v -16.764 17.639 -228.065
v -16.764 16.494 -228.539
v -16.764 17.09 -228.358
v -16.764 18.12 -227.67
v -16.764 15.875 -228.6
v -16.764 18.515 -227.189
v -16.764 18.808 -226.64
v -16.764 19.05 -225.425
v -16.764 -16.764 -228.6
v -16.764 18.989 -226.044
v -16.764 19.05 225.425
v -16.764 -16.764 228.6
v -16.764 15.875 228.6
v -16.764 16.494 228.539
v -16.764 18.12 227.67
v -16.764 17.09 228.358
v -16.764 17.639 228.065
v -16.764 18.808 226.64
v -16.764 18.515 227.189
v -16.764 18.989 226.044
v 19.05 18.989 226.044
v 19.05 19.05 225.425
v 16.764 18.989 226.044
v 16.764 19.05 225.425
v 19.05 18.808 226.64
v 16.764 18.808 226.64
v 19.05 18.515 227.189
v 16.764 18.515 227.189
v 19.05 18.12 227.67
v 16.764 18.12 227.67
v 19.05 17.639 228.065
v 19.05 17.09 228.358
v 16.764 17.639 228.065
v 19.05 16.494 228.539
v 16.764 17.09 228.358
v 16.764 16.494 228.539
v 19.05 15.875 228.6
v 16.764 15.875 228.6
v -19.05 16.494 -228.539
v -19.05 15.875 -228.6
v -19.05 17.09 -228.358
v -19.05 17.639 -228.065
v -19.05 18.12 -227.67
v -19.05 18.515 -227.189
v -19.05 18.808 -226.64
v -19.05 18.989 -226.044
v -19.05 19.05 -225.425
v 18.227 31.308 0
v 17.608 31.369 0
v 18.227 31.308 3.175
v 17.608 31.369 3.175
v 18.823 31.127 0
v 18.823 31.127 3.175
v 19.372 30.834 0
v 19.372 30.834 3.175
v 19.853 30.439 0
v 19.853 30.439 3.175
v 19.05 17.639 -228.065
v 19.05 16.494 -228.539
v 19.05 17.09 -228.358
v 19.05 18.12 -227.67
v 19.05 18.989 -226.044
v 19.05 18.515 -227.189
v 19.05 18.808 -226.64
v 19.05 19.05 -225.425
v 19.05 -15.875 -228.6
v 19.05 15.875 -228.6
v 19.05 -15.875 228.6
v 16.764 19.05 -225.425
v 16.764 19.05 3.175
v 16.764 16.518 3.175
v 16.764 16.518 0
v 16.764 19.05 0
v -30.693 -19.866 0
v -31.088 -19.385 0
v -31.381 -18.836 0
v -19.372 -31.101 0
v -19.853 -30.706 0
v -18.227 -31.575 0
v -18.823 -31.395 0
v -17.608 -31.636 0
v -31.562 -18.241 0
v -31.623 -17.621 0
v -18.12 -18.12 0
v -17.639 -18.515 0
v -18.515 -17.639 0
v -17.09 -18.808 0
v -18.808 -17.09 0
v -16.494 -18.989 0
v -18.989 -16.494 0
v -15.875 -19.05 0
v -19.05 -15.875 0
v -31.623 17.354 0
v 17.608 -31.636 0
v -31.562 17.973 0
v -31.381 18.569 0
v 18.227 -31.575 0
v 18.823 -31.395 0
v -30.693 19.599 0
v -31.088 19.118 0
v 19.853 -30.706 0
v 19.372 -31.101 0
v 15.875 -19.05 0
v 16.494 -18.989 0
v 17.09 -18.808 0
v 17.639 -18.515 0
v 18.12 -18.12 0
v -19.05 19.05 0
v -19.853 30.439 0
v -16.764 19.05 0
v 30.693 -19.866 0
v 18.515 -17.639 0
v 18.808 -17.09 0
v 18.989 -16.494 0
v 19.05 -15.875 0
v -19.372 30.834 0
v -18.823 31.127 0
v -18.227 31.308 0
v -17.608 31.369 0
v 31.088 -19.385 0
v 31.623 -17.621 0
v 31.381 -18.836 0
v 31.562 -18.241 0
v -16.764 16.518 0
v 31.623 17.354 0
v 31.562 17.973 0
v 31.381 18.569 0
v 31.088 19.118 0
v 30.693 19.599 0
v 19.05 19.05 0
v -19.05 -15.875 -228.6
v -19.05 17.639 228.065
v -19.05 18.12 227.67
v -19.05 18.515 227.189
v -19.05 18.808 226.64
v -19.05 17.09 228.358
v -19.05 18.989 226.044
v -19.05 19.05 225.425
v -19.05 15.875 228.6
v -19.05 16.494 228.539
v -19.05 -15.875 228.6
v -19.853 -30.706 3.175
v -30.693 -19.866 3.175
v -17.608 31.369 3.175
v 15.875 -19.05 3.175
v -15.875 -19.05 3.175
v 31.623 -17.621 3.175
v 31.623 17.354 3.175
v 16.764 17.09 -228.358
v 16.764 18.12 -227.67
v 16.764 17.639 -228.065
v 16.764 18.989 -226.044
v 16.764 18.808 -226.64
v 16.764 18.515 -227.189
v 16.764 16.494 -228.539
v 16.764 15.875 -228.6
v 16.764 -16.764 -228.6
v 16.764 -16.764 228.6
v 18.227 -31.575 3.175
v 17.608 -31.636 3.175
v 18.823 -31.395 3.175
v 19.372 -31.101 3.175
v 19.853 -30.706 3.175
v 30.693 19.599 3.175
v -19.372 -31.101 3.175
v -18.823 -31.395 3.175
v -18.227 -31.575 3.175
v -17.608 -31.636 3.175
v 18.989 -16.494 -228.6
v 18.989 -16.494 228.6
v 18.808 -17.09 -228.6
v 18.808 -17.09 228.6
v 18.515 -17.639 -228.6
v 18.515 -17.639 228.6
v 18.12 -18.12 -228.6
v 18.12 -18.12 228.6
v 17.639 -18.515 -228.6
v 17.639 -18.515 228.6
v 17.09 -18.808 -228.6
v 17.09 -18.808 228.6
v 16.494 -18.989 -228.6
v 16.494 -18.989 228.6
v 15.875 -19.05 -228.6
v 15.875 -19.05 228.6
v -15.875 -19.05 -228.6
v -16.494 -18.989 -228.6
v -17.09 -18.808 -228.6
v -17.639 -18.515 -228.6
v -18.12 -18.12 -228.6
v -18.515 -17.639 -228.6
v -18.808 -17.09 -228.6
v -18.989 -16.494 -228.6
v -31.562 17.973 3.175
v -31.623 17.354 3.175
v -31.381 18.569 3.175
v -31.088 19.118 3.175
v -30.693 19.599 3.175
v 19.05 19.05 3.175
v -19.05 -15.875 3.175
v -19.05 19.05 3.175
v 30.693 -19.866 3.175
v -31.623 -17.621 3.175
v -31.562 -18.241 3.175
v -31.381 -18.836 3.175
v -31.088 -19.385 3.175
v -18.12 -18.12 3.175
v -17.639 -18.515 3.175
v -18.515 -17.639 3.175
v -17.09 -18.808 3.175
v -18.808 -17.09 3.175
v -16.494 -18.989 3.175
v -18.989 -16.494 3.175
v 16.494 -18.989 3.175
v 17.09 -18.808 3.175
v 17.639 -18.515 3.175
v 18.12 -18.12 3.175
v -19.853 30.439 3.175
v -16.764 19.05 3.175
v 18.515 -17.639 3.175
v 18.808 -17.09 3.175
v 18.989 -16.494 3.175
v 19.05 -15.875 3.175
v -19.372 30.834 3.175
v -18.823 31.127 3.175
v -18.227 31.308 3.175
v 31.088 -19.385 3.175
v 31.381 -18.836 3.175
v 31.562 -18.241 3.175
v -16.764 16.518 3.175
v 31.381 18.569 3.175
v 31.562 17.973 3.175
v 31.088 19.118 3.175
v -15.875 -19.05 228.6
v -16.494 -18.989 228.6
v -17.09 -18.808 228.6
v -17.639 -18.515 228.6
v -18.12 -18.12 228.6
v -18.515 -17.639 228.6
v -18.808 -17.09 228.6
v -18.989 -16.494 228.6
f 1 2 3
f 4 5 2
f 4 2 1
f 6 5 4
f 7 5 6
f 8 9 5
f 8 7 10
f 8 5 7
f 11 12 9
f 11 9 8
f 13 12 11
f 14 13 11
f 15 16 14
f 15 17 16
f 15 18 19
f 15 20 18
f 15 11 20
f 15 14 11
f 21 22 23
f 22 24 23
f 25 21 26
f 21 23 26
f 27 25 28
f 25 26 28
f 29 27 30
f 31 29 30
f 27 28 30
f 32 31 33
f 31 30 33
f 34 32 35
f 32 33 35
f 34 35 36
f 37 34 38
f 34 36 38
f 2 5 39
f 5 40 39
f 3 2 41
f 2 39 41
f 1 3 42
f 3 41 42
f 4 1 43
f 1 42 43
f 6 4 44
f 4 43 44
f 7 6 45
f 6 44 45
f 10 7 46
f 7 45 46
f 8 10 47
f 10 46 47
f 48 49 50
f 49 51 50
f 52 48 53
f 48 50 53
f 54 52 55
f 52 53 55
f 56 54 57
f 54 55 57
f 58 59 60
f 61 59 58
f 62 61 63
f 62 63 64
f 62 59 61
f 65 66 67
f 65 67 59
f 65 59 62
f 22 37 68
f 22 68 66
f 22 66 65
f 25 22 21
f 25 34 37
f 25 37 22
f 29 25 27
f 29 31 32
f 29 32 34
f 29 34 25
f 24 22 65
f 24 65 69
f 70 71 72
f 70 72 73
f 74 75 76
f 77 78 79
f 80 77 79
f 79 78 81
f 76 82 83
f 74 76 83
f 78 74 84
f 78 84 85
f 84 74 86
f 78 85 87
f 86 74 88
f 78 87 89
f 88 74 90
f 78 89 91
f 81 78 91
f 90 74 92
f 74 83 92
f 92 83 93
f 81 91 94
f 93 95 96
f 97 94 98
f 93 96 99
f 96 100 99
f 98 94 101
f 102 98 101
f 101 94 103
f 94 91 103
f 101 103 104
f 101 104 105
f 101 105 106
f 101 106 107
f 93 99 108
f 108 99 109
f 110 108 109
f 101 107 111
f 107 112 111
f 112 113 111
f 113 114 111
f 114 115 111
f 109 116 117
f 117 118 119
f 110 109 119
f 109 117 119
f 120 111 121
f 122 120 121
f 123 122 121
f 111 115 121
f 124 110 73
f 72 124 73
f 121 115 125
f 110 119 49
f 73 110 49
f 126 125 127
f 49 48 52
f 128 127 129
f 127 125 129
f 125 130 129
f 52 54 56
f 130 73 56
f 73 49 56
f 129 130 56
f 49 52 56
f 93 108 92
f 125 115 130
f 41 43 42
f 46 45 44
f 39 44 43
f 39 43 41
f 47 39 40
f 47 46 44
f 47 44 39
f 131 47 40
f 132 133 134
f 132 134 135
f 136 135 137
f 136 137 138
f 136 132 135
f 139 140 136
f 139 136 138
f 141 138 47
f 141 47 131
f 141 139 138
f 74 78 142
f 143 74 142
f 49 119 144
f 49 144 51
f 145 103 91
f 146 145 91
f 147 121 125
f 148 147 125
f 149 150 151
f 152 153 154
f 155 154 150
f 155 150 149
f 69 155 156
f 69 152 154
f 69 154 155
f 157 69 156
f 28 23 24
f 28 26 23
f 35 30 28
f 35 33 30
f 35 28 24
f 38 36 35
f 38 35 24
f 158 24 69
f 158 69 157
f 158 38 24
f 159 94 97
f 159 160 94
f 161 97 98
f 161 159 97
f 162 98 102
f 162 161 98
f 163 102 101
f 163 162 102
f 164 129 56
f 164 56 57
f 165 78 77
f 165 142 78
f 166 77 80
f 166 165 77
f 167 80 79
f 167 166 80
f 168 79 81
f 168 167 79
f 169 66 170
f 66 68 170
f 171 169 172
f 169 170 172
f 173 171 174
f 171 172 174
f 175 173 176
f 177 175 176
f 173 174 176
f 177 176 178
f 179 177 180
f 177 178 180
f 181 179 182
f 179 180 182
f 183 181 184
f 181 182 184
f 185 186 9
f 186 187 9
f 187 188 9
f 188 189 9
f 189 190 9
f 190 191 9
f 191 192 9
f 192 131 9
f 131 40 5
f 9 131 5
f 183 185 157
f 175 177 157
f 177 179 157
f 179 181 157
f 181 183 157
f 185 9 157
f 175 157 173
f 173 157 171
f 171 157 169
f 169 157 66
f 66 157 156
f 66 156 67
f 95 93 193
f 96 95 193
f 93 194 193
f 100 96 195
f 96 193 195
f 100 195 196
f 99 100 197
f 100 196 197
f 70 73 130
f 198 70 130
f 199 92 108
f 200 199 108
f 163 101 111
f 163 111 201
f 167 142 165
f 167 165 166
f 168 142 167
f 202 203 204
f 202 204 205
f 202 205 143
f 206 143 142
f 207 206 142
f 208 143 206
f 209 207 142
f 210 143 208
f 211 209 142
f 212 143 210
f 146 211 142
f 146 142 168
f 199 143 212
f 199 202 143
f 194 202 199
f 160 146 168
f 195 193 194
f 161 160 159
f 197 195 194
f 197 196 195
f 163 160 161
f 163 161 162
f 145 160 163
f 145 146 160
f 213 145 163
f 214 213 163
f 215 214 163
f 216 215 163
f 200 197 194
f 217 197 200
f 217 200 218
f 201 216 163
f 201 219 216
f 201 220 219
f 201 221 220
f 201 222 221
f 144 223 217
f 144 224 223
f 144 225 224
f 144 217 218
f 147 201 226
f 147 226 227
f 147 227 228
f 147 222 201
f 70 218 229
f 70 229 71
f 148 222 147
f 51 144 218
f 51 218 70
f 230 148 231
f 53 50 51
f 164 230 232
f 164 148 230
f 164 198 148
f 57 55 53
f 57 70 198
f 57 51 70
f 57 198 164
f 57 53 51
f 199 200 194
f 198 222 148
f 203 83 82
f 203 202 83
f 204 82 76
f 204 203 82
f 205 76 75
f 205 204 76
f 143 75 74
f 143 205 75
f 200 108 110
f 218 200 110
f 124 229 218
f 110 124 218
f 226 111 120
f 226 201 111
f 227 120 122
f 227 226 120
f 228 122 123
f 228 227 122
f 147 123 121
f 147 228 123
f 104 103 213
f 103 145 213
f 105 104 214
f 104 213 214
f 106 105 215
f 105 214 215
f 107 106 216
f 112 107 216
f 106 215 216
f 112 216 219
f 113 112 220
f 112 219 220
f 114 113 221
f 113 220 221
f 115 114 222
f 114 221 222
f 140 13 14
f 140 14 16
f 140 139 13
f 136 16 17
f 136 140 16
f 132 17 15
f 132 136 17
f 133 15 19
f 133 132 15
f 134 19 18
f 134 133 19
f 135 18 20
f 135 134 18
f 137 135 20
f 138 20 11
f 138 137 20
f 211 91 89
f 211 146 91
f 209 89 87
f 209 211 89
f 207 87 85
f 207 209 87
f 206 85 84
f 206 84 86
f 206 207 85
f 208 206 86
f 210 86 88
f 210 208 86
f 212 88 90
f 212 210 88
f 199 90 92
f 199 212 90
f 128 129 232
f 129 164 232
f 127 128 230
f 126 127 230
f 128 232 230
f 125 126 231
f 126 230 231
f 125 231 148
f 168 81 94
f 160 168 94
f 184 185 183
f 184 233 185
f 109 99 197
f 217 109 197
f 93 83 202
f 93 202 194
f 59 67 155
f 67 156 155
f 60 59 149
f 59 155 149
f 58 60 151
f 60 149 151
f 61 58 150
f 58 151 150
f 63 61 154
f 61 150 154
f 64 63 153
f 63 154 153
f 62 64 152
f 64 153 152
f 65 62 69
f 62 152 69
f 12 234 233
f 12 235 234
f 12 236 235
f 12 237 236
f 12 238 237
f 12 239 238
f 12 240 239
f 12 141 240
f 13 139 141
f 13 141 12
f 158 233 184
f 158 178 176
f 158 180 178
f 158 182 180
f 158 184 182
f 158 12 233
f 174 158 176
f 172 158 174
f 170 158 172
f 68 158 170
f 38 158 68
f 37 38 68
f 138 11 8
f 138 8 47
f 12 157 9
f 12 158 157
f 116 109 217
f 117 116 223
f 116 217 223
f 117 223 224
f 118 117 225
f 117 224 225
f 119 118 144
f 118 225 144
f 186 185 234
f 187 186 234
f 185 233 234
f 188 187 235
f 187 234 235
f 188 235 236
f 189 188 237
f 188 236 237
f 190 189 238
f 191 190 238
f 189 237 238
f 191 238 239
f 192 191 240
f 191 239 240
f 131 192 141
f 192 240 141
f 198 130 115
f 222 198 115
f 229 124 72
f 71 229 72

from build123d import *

# Parameters (mm, degrees)
F1_DEPTH = 228.6
F2_R     = 3.175
F3_R     = 3.175
F0_W     = 63.246
F0_H     = 63.0053096
F0_W_2   = 33.528
F0_H_2   = 2.53238
F4_DEPTH = 3.175
F5_SIZE  = 12.7
F6_R     = 3.175
F7_R     = 3.175


with BuildPart() as f1:
    # F0 (on Top) → F1 (new body, symmetric)
    with BuildSketch(Plane.XY):
        Polygon((-16.764, 19.05), (-19.05, 19.05), (-19.05, -19.05), (19.05, -19.05), (19.05, 19.05), (16.764, 19.05), (16.764, 16.51762), (16.764, -16.764), (-16.764, -16.764), (-16.764, 16.51762), align=None)
    extrude(amount=F1_DEPTH, both=True)

    # F2
    f2_edges = [f1.edges().sort_by_distance(p)[0] for p in [
        (19.05, -19.05, 0),
        (-19.05, -19.05, 0),
    ]]
    fillet(f2_edges, radius=F2_R)

    # F3
    f3_edges = [f1.edges().sort_by_distance(p)[0] for p in [
        (-17.907, 19.05, 228.6),
        (17.907, 19.05, 228.6),
        (-17.907, 19.05, -228.6),
        (17.907, 19.05, -228.6),
    ]]
    fillet(f3_edges, radius=F3_R)


with BuildPart() as f4:
    # F0 (on Top) → F4 (new body)
    with BuildSketch(Plane.XY):
        with Locations((0, -0.1336548)):
            Rectangle(F0_W, F0_H)
        Polygon((-19.05, -19.05), (-19.05, 19.05), (-16.764, 19.05), (16.764, 19.05), (19.05, 19.05), (19.05, -19.05), align=None, mode=Mode.SUBTRACT)
        with Locations((0, 17.78381)):
            Rectangle(F0_W_2, F0_H_2)
    extrude(amount=F4_DEPTH)

    # F5
    f5_edges = [f4.edges().sort_by_distance(p)[0] for p in [
        (-31.623, 31.369, 1.5875),
        (-31.623, -31.63631, 1.5875),
        (31.623, -31.63631, 1.5875),
        (31.623, 31.369, 1.5875),
    ]]
    chamfer(f5_edges, length=F5_SIZE)

    # F6
    f6_edges = [f4.edges().sort_by_distance(p)[0] for p in [
        (-19.05, -19.05, 1.5875),
        (19.05, -19.05, 1.5875),
    ]]
    fillet(f6_edges, radius=F6_R)

    # F7
    f7_edges = [f4.edges().sort_by_distance(p)[0] for p in [
        (31.623, -18.93631, 1.5875),
        (31.623, 18.669, 1.5875),
        (18.923, 31.369, 1.5875),
        (-18.923, 31.369, 1.5875),
        (18.923, -31.63631, 1.5875),
        (-18.923, -31.63631, 1.5875),
        (-31.623, 18.669, 1.5875),
        (-31.623, -18.93631, 1.5875),
    ]]
    fillet(f7_edges, radius=F7_R)


solid = Compound([f1.part, f4.part])
